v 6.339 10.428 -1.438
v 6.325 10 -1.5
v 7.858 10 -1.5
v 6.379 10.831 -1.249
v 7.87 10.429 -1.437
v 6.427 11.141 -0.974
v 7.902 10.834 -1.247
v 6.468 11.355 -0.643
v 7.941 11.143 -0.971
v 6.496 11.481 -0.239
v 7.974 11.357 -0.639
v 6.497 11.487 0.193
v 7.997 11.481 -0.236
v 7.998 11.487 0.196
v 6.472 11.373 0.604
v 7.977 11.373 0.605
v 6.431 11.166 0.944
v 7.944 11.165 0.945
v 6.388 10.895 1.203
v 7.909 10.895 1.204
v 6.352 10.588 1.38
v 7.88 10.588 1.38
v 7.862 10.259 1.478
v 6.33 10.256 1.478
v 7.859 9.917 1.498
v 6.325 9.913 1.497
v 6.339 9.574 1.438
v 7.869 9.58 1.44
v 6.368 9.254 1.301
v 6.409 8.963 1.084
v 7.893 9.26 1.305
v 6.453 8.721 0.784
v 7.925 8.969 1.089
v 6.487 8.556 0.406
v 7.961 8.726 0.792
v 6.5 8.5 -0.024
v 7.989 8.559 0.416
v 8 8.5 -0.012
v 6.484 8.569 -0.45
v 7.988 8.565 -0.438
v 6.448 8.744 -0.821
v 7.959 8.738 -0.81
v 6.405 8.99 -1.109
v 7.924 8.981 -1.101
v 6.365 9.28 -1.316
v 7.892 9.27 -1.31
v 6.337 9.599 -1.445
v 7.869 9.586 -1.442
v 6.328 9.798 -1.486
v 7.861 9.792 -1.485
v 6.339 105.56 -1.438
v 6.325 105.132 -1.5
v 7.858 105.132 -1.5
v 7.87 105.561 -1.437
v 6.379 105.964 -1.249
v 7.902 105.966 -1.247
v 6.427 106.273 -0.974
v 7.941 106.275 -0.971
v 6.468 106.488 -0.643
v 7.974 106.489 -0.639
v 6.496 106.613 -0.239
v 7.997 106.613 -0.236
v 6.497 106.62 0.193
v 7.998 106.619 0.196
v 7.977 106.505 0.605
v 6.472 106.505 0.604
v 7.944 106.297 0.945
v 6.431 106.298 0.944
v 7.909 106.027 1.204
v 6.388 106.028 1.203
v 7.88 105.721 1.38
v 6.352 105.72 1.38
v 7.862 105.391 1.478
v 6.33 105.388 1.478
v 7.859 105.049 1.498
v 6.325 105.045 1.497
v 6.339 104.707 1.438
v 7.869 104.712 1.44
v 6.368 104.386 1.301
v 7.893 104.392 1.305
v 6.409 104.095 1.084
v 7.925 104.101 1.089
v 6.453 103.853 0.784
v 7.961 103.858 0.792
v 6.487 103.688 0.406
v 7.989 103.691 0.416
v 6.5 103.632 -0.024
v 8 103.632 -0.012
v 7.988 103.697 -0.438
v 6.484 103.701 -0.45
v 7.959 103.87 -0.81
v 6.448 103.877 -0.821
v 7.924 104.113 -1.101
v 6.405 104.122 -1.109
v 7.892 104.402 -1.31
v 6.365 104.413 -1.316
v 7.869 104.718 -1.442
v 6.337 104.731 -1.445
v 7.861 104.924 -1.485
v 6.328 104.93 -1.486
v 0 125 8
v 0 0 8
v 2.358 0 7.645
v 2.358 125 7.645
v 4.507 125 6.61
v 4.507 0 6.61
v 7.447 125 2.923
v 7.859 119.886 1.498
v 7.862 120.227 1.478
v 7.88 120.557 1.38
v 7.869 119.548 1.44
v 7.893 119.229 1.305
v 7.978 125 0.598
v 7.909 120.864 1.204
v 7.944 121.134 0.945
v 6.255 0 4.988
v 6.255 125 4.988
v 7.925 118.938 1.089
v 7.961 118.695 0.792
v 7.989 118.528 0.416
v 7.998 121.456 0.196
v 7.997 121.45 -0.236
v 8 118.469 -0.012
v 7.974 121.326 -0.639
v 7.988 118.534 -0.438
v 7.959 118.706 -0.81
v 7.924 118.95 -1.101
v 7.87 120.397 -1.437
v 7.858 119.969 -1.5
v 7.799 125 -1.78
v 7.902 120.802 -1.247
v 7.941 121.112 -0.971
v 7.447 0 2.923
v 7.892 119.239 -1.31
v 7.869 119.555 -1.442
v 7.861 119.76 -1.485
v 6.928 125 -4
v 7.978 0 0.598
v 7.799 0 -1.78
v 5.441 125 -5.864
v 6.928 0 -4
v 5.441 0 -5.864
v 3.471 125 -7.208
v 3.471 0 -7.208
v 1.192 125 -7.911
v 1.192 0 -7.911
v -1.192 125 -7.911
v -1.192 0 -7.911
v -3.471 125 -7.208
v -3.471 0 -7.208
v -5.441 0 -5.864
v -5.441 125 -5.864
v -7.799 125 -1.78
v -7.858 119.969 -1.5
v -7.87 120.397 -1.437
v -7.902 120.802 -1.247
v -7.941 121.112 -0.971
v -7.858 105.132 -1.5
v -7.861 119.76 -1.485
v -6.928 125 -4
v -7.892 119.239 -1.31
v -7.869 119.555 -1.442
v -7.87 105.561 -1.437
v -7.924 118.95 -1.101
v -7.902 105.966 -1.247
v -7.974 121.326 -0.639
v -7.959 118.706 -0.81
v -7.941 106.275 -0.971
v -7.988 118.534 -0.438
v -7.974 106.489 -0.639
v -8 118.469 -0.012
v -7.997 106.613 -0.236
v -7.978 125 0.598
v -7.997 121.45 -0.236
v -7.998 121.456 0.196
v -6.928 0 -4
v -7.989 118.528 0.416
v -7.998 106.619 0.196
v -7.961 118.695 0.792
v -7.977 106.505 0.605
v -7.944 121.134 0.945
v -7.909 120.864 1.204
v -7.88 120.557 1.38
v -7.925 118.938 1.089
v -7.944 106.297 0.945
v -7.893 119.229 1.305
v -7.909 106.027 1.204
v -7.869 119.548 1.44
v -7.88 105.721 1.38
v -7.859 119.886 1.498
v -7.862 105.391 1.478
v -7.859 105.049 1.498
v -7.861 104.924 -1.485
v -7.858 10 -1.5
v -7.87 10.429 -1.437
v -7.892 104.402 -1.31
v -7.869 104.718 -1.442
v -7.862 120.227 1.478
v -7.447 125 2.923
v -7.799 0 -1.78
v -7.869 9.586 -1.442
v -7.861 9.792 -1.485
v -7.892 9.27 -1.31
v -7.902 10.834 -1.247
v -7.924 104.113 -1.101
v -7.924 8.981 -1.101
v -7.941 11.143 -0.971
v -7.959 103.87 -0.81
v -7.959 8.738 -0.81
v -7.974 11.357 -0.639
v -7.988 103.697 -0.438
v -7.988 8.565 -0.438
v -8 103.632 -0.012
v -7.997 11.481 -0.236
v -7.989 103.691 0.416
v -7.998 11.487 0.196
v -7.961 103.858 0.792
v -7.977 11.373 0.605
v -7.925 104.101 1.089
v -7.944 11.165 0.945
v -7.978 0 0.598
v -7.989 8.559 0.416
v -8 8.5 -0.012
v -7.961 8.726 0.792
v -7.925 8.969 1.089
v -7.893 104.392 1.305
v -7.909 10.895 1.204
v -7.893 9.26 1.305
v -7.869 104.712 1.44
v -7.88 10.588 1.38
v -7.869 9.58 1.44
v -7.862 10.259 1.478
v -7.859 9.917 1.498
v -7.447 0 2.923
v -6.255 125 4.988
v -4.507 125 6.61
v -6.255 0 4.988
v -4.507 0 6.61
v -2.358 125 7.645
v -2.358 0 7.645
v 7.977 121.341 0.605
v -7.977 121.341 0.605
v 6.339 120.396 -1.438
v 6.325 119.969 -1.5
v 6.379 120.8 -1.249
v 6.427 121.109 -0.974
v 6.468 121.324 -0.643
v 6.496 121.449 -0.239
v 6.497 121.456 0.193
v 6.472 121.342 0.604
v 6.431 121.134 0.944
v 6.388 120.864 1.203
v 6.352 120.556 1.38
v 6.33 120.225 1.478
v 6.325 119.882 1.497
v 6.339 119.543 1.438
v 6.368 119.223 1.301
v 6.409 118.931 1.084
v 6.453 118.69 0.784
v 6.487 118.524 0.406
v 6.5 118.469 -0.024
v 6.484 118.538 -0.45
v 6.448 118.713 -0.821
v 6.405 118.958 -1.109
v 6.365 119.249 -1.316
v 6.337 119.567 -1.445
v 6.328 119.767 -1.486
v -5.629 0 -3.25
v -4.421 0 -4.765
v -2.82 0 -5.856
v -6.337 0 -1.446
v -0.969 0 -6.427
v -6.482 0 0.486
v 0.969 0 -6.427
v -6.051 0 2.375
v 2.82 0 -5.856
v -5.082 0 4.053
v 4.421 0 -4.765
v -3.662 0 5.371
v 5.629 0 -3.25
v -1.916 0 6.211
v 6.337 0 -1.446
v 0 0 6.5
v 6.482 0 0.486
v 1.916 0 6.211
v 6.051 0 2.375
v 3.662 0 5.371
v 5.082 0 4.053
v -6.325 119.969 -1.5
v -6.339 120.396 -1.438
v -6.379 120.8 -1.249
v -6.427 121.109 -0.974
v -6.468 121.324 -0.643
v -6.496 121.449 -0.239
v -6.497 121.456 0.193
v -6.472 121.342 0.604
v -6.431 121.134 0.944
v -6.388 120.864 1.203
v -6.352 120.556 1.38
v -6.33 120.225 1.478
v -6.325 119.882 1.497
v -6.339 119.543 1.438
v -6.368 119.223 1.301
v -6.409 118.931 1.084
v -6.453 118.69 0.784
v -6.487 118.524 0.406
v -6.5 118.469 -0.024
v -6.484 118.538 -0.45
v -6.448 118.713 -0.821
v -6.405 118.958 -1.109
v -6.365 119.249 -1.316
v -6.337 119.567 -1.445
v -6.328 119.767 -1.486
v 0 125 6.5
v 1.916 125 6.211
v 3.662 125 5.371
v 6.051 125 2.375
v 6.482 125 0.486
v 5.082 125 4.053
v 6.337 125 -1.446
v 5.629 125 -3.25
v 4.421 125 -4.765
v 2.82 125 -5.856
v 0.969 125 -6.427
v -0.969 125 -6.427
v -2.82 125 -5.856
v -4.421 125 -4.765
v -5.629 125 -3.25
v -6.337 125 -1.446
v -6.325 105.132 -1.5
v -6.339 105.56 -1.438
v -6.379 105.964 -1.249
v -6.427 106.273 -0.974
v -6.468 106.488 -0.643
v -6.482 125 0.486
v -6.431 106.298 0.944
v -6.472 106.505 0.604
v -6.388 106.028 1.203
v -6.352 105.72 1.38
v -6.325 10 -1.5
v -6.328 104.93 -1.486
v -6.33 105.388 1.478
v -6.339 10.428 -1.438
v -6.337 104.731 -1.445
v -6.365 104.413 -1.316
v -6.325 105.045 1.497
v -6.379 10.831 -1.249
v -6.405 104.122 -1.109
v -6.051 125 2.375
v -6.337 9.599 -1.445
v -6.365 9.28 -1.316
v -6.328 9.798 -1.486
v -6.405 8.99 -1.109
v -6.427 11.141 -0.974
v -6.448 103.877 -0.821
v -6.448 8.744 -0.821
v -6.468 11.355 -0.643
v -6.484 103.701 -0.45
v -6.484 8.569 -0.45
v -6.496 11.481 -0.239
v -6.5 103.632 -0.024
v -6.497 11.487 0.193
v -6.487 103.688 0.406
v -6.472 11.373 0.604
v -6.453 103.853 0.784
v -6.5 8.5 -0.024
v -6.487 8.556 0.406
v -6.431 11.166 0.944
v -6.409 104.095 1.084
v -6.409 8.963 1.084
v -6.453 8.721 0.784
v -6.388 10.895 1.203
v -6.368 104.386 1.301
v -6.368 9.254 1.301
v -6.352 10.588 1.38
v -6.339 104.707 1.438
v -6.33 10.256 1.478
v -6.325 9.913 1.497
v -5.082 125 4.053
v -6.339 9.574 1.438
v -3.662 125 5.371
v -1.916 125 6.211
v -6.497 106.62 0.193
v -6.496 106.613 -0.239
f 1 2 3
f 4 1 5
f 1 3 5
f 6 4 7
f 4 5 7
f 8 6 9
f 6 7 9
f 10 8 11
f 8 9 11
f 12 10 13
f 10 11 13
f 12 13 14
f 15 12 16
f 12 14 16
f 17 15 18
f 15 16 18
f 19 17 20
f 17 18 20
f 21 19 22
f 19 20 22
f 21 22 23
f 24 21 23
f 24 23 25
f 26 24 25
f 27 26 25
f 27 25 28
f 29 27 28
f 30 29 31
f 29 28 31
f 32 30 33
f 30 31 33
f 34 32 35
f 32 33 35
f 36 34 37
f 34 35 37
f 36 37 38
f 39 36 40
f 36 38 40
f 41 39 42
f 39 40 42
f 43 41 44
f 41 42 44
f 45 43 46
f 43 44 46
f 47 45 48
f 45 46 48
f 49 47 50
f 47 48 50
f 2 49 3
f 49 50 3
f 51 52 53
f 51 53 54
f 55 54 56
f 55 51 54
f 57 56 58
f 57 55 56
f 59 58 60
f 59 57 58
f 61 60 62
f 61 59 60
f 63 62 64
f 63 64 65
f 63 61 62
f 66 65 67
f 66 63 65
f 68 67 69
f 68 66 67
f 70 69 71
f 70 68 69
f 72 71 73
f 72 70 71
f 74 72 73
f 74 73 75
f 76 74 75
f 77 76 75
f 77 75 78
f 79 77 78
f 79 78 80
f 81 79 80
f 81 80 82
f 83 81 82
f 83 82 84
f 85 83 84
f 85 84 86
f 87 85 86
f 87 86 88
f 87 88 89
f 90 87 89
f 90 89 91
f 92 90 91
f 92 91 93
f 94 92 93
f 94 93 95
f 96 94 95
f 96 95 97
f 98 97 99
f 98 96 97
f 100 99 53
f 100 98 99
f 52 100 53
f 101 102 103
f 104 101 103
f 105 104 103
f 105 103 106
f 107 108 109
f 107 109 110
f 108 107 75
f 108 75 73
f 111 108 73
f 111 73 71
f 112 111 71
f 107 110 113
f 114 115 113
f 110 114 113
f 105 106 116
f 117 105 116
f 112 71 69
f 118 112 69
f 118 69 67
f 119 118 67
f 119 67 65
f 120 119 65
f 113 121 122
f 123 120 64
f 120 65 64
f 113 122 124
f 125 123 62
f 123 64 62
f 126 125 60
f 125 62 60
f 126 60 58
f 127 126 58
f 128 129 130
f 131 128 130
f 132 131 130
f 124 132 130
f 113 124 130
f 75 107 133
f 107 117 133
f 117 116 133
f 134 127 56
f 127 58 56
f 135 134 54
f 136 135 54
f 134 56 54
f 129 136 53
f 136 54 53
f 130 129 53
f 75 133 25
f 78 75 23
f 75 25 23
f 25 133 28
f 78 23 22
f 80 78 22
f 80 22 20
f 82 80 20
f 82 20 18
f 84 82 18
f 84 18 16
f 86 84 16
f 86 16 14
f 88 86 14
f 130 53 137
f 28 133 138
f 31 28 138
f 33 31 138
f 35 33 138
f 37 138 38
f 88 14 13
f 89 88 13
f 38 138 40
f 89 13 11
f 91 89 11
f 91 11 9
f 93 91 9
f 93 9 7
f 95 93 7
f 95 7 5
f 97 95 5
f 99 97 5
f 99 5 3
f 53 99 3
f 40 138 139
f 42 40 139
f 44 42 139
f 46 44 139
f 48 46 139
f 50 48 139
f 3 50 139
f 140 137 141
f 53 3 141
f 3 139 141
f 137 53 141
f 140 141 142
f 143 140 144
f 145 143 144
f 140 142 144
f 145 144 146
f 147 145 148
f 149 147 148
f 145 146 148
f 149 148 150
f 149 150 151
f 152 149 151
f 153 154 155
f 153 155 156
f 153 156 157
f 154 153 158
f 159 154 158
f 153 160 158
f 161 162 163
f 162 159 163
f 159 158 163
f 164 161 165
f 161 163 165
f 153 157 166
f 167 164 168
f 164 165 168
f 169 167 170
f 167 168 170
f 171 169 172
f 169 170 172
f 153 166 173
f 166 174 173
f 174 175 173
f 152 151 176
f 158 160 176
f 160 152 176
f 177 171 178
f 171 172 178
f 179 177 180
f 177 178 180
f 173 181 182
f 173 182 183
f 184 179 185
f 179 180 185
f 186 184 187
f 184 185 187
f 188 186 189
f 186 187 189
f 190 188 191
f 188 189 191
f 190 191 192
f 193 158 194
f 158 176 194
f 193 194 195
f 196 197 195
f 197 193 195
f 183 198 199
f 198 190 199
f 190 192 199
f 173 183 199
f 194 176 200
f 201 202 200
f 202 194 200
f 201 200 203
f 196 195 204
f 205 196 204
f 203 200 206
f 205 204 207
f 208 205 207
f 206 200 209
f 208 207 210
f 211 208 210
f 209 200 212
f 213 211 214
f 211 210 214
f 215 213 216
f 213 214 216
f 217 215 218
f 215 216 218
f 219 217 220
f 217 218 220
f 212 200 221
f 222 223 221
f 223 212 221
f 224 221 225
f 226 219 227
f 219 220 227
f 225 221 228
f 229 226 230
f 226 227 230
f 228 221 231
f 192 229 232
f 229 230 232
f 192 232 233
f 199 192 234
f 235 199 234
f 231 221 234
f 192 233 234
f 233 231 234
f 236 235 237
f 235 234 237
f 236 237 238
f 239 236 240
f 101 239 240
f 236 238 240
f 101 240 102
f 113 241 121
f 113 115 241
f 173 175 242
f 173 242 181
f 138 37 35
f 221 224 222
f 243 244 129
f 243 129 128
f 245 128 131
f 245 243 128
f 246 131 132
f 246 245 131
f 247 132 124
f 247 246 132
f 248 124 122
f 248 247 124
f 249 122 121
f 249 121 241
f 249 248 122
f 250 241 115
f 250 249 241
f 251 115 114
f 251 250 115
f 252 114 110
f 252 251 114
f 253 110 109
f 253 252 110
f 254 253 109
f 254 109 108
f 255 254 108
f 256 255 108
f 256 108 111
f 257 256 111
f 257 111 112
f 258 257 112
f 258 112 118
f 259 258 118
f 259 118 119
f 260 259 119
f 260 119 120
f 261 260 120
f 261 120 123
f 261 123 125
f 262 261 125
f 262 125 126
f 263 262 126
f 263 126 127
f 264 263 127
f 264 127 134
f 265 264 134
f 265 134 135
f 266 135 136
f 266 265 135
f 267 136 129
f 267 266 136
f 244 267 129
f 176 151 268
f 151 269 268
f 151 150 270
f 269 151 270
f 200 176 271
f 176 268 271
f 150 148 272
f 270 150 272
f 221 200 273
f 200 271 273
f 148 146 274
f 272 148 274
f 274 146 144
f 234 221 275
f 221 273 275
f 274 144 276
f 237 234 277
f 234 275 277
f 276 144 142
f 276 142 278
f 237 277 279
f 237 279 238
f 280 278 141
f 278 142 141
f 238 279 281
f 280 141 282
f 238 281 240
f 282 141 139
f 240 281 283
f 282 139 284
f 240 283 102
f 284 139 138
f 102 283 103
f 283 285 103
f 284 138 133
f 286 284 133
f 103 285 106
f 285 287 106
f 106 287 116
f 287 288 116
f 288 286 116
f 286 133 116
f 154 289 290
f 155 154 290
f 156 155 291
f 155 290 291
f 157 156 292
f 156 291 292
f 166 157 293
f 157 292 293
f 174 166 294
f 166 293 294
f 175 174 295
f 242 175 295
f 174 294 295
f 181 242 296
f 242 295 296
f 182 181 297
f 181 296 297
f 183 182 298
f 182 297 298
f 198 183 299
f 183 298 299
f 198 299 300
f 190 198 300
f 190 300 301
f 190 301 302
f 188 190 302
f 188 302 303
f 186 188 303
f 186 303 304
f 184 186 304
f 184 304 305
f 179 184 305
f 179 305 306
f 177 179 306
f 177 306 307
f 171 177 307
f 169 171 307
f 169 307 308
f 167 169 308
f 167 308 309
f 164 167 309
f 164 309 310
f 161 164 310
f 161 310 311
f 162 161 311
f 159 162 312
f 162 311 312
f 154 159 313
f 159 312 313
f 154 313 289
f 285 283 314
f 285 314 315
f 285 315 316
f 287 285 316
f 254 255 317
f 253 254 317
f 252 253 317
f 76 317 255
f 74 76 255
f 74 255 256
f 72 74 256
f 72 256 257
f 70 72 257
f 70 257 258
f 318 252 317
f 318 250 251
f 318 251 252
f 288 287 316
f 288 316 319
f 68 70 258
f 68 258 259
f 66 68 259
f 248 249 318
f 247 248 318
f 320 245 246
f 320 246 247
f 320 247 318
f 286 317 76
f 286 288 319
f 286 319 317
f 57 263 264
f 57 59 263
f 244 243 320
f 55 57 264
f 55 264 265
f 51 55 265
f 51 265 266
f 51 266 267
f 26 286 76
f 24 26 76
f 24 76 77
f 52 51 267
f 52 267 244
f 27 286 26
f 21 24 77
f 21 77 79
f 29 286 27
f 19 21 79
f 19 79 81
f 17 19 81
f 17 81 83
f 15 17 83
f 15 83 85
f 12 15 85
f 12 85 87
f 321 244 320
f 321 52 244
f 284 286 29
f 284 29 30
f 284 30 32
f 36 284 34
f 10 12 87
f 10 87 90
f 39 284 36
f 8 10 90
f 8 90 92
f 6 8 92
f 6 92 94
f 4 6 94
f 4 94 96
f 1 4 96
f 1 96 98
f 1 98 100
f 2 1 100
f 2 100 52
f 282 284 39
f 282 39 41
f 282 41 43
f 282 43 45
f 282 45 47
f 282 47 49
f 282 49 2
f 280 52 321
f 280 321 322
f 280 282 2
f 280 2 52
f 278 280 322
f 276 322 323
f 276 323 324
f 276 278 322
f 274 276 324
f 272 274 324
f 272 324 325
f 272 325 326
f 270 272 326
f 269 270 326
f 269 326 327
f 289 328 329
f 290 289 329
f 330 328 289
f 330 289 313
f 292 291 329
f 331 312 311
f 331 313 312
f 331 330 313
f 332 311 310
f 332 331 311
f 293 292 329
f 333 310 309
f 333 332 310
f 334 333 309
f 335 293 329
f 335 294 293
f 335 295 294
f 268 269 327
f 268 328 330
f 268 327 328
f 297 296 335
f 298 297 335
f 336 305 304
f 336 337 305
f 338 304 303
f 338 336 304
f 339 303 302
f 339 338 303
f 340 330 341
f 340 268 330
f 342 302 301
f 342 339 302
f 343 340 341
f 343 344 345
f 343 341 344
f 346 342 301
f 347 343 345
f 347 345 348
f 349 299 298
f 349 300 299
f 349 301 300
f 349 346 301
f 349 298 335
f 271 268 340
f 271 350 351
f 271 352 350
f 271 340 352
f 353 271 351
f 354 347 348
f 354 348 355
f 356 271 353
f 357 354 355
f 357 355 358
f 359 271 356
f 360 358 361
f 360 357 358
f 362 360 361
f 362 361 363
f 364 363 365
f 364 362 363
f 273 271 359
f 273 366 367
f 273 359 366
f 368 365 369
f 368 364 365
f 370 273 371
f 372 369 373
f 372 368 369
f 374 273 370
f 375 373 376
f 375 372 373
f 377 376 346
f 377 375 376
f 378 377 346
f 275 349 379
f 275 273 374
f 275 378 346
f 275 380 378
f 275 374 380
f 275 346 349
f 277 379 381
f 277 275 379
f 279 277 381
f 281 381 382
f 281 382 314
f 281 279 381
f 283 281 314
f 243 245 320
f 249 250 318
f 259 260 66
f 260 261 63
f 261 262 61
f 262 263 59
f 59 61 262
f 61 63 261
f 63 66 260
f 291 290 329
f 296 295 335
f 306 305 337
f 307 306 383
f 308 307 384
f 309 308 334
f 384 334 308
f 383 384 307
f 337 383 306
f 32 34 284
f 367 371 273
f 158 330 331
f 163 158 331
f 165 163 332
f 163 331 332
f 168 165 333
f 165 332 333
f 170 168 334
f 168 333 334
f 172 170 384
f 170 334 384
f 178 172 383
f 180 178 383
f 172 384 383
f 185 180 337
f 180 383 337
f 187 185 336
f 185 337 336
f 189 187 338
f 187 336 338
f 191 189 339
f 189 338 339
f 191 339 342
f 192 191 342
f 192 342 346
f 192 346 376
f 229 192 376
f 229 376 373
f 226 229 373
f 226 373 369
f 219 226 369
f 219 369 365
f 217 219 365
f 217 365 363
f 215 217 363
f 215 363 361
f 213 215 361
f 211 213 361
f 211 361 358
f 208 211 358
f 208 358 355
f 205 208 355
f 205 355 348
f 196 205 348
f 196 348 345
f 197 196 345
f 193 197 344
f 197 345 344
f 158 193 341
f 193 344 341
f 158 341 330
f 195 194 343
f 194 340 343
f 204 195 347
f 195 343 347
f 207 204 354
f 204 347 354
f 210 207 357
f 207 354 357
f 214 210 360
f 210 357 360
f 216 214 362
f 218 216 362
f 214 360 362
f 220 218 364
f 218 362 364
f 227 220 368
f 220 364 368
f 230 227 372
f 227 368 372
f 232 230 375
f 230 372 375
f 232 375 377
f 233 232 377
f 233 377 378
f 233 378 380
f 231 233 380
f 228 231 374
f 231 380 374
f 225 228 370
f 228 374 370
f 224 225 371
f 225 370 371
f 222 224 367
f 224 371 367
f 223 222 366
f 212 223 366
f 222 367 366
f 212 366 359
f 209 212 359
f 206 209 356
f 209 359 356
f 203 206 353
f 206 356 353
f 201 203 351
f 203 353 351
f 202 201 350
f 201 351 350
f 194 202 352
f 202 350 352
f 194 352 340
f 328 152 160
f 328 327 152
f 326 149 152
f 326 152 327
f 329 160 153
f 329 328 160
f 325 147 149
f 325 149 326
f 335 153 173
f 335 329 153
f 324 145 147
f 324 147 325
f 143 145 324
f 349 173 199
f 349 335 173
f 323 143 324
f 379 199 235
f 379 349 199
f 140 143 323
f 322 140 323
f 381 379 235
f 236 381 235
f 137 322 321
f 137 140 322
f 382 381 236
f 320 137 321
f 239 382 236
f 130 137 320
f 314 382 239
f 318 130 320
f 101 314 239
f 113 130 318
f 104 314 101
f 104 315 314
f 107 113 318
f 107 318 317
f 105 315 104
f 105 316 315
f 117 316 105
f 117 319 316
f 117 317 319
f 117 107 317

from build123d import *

# Parameters (mm, degrees)
SKETCH_1_R          = 8
SKETCH_1_R_2        = 6.5
EXTRUDE_1_DEPTH     = 125
SKETCH_3_R          = 1.5
CUT_EXTRUDE_2_DEPTH = 62.5


with BuildPart() as part:
    # 草图1 → 凸台-拉伸1 (new body)
    with BuildSketch(Plane(origin=(0, 0, 0), x_dir=(1, 0, 0), z_dir=(0, 1, 0))):
        with Locations(Location((0, 0, 0), (0, 0, 270))):
            Circle(SKETCH_1_R)
        with Locations(Location((0, 0, 0), (0, 0, 270))):
            Circle(SKETCH_1_R_2, mode=Mode.SUBTRACT)
    extrude(amount=EXTRUDE_1_DEPTH)

    # 草图3 → 切除-拉伸2 (cut, symmetric)
    with BuildSketch(Plane(origin=(0, 0, 0), x_dir=(0, 0, -1), z_dir=(1, 0, 0))):
        with Locations((0, 119.968615881)):
            Circle(SKETCH_3_R)
        with Locations((0, 105.132120497)):
            Circle(SKETCH_3_R)
        with Locations((0, 10)):
            Circle(SKETCH_3_R)
    extrude(amount=CUT_EXTRUDE_2_DEPTH, both=True, mode=Mode.SUBTRACT)


solid = part.part
